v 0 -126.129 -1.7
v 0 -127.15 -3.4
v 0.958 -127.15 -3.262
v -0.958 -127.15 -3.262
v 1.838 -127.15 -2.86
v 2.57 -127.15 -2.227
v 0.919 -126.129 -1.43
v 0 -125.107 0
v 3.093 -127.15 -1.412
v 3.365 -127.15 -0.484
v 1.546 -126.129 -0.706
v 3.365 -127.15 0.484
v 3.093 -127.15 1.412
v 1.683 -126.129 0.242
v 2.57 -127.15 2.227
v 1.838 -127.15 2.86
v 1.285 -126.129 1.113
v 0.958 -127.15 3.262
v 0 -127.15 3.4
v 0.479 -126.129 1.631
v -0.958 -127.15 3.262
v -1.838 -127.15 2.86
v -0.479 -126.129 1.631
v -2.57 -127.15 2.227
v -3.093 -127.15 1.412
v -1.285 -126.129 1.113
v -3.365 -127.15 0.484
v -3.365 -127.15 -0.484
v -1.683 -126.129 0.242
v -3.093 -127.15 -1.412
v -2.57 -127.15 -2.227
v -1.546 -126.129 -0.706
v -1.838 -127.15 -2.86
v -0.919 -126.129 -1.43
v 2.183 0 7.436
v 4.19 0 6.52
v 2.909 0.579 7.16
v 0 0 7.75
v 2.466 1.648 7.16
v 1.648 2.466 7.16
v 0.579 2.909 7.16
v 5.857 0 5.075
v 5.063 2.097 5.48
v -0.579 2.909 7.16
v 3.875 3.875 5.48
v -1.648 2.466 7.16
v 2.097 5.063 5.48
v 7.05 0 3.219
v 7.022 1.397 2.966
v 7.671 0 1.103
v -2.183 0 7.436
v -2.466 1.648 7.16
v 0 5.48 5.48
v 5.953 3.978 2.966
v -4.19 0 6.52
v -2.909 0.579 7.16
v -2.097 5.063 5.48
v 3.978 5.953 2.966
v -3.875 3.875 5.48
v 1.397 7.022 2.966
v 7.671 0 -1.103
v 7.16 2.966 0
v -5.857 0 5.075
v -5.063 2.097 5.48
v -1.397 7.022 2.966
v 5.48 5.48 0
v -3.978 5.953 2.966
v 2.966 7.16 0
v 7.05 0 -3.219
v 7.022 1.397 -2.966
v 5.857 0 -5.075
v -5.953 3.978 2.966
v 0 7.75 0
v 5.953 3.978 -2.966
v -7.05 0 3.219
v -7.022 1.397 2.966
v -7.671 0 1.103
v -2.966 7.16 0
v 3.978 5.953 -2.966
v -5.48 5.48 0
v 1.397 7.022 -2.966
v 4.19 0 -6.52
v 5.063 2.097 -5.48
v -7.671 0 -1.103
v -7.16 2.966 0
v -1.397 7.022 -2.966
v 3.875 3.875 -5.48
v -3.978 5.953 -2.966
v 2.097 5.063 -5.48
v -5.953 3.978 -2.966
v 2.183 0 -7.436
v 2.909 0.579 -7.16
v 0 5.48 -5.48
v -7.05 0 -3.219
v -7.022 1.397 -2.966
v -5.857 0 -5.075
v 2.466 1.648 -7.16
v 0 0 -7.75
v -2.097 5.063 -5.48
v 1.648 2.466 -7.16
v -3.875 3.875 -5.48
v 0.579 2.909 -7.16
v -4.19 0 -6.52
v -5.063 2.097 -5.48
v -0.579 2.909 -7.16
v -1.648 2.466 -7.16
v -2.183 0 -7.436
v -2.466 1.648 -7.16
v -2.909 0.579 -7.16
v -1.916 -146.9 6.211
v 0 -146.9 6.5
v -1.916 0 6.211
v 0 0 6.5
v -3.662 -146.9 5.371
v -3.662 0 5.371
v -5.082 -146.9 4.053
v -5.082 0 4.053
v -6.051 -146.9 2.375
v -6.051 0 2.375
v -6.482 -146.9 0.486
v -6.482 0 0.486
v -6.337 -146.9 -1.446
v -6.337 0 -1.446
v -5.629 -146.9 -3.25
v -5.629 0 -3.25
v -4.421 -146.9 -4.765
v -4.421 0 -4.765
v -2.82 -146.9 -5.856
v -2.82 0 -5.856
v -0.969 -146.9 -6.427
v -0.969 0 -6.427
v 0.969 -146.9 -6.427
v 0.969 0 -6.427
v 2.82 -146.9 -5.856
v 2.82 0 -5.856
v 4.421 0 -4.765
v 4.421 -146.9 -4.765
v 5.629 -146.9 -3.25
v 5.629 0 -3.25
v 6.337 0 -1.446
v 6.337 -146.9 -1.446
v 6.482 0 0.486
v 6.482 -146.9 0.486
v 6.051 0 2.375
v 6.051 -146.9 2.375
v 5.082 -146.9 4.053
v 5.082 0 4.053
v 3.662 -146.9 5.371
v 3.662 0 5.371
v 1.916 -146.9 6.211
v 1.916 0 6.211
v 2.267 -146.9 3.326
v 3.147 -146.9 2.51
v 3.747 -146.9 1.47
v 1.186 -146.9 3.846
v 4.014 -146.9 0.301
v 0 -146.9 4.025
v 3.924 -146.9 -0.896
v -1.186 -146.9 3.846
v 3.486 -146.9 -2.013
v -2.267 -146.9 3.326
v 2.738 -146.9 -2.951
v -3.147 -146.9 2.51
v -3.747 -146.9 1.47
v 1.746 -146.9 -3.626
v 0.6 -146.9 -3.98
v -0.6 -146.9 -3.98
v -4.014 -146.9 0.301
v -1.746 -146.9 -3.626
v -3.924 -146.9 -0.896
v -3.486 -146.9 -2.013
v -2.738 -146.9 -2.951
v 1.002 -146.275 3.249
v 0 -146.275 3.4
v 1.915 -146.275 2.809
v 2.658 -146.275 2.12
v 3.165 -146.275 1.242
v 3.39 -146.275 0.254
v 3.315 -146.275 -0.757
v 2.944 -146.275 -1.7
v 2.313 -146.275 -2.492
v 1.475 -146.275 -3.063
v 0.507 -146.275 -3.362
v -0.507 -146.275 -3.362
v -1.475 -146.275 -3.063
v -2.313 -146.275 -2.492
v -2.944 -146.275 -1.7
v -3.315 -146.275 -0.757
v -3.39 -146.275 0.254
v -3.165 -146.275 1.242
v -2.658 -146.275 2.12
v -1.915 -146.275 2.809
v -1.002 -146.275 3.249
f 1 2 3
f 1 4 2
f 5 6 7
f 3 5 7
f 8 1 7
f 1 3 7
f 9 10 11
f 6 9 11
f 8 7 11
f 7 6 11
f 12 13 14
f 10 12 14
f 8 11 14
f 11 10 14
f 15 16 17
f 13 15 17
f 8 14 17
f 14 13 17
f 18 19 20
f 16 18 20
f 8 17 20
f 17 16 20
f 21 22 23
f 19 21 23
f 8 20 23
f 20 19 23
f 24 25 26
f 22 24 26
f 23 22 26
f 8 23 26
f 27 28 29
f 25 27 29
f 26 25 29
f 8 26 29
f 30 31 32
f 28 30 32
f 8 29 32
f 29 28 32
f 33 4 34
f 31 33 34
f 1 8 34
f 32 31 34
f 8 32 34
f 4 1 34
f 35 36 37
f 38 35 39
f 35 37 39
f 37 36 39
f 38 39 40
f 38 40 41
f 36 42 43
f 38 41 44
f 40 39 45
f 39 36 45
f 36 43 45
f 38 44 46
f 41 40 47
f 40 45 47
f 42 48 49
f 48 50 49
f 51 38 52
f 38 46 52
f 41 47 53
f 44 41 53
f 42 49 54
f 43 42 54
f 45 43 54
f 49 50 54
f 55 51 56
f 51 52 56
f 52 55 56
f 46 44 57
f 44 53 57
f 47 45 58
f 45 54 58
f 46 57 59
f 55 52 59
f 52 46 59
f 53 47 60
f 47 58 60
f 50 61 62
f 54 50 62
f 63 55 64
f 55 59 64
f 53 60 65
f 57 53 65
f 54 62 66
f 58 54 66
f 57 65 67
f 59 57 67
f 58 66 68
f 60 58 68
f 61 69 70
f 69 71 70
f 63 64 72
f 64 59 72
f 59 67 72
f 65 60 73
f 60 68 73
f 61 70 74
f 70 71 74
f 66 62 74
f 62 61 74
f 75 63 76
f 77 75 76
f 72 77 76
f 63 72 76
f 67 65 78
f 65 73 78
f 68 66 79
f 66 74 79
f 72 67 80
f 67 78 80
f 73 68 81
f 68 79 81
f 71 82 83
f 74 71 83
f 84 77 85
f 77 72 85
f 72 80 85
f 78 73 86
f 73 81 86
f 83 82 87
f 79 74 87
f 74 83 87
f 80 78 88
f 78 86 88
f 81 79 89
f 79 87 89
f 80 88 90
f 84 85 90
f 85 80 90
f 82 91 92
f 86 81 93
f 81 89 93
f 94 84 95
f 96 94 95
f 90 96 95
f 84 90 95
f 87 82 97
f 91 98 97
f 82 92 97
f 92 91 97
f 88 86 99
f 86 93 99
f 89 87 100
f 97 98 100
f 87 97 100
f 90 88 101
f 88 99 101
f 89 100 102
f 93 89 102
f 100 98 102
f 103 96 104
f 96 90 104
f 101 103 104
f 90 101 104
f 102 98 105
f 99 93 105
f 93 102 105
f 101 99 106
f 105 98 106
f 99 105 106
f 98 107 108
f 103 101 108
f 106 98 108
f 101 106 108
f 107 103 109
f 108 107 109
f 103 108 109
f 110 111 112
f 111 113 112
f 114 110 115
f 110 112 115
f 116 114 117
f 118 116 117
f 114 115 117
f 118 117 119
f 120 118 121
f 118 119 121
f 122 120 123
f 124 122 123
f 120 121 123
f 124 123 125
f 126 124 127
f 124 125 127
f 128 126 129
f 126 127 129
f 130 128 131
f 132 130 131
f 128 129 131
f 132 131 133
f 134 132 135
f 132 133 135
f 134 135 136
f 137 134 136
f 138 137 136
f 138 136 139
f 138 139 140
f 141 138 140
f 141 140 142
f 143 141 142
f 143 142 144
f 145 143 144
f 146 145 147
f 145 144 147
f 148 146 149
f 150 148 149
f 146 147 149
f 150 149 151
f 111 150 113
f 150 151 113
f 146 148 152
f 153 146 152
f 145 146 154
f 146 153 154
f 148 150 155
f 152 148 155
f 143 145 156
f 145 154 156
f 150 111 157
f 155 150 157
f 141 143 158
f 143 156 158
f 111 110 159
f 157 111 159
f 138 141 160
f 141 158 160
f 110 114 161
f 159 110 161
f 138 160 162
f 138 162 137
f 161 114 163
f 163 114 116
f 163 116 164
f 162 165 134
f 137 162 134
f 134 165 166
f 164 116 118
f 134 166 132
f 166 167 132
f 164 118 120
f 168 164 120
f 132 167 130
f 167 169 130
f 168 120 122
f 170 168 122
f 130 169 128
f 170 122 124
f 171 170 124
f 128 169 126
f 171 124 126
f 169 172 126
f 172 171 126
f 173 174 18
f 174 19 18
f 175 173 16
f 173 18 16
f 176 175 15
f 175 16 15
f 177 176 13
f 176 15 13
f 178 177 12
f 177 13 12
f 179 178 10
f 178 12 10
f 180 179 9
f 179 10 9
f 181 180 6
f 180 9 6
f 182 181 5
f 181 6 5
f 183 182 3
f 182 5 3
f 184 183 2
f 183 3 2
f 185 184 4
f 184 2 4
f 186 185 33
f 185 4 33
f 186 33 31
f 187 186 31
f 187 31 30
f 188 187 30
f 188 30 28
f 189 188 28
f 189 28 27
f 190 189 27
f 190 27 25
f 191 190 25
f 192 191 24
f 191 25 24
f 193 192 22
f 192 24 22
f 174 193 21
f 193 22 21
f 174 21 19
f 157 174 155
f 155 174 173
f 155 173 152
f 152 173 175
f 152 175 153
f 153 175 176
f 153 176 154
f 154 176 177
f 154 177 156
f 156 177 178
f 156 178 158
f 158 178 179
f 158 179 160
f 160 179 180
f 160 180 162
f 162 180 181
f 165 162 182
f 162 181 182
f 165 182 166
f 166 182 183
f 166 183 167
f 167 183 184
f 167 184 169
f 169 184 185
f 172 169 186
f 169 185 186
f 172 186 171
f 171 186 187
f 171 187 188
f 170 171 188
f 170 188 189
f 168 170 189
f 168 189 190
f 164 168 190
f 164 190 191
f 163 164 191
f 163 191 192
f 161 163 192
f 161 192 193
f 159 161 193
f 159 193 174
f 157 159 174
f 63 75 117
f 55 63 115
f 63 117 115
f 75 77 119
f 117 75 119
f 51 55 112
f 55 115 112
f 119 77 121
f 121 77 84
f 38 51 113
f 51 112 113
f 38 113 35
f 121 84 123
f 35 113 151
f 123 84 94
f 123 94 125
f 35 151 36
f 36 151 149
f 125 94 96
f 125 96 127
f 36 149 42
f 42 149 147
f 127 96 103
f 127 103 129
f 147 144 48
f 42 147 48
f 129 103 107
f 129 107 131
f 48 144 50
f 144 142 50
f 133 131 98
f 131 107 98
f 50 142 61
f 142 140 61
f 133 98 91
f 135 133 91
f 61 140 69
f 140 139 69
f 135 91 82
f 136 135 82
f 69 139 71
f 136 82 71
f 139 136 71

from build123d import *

# Parameters (mm, degrees)
REVOLVE_1_ANGLE              = 180
SKETCH_6_W                   = 6.5
SKETCH_6_H                   = 146.9
HOLE_WIZARD_M8_1_D           = 6.8
HOLE_WIZARD_M8_1_DEPTH       = 19.75
HOLE_WIZARD_M8_1_CSINK_D     = 8.05
HOLE_WIZARD_M8_1_CSINK_ANGLE = 90
HOLE_WIZARD_M8_1_TIP         = 2.042926105


with BuildPart() as part:
    # 草图1 → 旋转1 (revolve)
    with BuildSketch(Plane(origin=(0, 0, 0), x_dir=(1, 0, 0), z_dir=(0, 1, 0))):
        with BuildLine():
            Line((0, 7.75), (0, -7.75))
            ThreePointArc((0, -7.75), (7.75, 0), (0, 7.75))
        make_face()
    revolve(axis=Axis((0, 0, -7.75), (0, 0, 1)), revolution_arc=REVOLVE_1_ANGLE)

    # 草图6 → 旋转2 (revolve)
    with BuildSketch(Plane(origin=(0, 0, 0), x_dir=(0, 0, -1), z_dir=(1, 0, 0)), mode=Mode.PRIVATE) as revolve_2_sk:
        with Locations((3.25, -73.45)):
            Rectangle(SKETCH_6_W, SKETCH_6_H)
    revolve(revolve_2_sk.sketch.rotate(Axis((0, 0, 0), (0, -1, 0)), 180), axis=Axis((0, 0, 0), (0, -1, 0)))

    # M8 螺纹孔1
    with Locations(Plane(origin=(0, -146.9, 0), x_dir=(0, 0, -1), z_dir=(0, -1, 0))):
        with Locations((0, 0)):
            CounterSinkHole(HOLE_WIZARD_M8_1_D / 2, HOLE_WIZARD_M8_1_CSINK_D / 2, depth=HOLE_WIZARD_M8_1_DEPTH, counter_sink_angle=HOLE_WIZARD_M8_1_CSINK_ANGLE)
            with Locations((0, 0, -(HOLE_WIZARD_M8_1_DEPTH + HOLE_WIZARD_M8_1_TIP / 2))):  # 118° drill point
                Cone(0, HOLE_WIZARD_M8_1_D / 2, HOLE_WIZARD_M8_1_TIP, mode=Mode.SUBTRACT)


solid = part.part
